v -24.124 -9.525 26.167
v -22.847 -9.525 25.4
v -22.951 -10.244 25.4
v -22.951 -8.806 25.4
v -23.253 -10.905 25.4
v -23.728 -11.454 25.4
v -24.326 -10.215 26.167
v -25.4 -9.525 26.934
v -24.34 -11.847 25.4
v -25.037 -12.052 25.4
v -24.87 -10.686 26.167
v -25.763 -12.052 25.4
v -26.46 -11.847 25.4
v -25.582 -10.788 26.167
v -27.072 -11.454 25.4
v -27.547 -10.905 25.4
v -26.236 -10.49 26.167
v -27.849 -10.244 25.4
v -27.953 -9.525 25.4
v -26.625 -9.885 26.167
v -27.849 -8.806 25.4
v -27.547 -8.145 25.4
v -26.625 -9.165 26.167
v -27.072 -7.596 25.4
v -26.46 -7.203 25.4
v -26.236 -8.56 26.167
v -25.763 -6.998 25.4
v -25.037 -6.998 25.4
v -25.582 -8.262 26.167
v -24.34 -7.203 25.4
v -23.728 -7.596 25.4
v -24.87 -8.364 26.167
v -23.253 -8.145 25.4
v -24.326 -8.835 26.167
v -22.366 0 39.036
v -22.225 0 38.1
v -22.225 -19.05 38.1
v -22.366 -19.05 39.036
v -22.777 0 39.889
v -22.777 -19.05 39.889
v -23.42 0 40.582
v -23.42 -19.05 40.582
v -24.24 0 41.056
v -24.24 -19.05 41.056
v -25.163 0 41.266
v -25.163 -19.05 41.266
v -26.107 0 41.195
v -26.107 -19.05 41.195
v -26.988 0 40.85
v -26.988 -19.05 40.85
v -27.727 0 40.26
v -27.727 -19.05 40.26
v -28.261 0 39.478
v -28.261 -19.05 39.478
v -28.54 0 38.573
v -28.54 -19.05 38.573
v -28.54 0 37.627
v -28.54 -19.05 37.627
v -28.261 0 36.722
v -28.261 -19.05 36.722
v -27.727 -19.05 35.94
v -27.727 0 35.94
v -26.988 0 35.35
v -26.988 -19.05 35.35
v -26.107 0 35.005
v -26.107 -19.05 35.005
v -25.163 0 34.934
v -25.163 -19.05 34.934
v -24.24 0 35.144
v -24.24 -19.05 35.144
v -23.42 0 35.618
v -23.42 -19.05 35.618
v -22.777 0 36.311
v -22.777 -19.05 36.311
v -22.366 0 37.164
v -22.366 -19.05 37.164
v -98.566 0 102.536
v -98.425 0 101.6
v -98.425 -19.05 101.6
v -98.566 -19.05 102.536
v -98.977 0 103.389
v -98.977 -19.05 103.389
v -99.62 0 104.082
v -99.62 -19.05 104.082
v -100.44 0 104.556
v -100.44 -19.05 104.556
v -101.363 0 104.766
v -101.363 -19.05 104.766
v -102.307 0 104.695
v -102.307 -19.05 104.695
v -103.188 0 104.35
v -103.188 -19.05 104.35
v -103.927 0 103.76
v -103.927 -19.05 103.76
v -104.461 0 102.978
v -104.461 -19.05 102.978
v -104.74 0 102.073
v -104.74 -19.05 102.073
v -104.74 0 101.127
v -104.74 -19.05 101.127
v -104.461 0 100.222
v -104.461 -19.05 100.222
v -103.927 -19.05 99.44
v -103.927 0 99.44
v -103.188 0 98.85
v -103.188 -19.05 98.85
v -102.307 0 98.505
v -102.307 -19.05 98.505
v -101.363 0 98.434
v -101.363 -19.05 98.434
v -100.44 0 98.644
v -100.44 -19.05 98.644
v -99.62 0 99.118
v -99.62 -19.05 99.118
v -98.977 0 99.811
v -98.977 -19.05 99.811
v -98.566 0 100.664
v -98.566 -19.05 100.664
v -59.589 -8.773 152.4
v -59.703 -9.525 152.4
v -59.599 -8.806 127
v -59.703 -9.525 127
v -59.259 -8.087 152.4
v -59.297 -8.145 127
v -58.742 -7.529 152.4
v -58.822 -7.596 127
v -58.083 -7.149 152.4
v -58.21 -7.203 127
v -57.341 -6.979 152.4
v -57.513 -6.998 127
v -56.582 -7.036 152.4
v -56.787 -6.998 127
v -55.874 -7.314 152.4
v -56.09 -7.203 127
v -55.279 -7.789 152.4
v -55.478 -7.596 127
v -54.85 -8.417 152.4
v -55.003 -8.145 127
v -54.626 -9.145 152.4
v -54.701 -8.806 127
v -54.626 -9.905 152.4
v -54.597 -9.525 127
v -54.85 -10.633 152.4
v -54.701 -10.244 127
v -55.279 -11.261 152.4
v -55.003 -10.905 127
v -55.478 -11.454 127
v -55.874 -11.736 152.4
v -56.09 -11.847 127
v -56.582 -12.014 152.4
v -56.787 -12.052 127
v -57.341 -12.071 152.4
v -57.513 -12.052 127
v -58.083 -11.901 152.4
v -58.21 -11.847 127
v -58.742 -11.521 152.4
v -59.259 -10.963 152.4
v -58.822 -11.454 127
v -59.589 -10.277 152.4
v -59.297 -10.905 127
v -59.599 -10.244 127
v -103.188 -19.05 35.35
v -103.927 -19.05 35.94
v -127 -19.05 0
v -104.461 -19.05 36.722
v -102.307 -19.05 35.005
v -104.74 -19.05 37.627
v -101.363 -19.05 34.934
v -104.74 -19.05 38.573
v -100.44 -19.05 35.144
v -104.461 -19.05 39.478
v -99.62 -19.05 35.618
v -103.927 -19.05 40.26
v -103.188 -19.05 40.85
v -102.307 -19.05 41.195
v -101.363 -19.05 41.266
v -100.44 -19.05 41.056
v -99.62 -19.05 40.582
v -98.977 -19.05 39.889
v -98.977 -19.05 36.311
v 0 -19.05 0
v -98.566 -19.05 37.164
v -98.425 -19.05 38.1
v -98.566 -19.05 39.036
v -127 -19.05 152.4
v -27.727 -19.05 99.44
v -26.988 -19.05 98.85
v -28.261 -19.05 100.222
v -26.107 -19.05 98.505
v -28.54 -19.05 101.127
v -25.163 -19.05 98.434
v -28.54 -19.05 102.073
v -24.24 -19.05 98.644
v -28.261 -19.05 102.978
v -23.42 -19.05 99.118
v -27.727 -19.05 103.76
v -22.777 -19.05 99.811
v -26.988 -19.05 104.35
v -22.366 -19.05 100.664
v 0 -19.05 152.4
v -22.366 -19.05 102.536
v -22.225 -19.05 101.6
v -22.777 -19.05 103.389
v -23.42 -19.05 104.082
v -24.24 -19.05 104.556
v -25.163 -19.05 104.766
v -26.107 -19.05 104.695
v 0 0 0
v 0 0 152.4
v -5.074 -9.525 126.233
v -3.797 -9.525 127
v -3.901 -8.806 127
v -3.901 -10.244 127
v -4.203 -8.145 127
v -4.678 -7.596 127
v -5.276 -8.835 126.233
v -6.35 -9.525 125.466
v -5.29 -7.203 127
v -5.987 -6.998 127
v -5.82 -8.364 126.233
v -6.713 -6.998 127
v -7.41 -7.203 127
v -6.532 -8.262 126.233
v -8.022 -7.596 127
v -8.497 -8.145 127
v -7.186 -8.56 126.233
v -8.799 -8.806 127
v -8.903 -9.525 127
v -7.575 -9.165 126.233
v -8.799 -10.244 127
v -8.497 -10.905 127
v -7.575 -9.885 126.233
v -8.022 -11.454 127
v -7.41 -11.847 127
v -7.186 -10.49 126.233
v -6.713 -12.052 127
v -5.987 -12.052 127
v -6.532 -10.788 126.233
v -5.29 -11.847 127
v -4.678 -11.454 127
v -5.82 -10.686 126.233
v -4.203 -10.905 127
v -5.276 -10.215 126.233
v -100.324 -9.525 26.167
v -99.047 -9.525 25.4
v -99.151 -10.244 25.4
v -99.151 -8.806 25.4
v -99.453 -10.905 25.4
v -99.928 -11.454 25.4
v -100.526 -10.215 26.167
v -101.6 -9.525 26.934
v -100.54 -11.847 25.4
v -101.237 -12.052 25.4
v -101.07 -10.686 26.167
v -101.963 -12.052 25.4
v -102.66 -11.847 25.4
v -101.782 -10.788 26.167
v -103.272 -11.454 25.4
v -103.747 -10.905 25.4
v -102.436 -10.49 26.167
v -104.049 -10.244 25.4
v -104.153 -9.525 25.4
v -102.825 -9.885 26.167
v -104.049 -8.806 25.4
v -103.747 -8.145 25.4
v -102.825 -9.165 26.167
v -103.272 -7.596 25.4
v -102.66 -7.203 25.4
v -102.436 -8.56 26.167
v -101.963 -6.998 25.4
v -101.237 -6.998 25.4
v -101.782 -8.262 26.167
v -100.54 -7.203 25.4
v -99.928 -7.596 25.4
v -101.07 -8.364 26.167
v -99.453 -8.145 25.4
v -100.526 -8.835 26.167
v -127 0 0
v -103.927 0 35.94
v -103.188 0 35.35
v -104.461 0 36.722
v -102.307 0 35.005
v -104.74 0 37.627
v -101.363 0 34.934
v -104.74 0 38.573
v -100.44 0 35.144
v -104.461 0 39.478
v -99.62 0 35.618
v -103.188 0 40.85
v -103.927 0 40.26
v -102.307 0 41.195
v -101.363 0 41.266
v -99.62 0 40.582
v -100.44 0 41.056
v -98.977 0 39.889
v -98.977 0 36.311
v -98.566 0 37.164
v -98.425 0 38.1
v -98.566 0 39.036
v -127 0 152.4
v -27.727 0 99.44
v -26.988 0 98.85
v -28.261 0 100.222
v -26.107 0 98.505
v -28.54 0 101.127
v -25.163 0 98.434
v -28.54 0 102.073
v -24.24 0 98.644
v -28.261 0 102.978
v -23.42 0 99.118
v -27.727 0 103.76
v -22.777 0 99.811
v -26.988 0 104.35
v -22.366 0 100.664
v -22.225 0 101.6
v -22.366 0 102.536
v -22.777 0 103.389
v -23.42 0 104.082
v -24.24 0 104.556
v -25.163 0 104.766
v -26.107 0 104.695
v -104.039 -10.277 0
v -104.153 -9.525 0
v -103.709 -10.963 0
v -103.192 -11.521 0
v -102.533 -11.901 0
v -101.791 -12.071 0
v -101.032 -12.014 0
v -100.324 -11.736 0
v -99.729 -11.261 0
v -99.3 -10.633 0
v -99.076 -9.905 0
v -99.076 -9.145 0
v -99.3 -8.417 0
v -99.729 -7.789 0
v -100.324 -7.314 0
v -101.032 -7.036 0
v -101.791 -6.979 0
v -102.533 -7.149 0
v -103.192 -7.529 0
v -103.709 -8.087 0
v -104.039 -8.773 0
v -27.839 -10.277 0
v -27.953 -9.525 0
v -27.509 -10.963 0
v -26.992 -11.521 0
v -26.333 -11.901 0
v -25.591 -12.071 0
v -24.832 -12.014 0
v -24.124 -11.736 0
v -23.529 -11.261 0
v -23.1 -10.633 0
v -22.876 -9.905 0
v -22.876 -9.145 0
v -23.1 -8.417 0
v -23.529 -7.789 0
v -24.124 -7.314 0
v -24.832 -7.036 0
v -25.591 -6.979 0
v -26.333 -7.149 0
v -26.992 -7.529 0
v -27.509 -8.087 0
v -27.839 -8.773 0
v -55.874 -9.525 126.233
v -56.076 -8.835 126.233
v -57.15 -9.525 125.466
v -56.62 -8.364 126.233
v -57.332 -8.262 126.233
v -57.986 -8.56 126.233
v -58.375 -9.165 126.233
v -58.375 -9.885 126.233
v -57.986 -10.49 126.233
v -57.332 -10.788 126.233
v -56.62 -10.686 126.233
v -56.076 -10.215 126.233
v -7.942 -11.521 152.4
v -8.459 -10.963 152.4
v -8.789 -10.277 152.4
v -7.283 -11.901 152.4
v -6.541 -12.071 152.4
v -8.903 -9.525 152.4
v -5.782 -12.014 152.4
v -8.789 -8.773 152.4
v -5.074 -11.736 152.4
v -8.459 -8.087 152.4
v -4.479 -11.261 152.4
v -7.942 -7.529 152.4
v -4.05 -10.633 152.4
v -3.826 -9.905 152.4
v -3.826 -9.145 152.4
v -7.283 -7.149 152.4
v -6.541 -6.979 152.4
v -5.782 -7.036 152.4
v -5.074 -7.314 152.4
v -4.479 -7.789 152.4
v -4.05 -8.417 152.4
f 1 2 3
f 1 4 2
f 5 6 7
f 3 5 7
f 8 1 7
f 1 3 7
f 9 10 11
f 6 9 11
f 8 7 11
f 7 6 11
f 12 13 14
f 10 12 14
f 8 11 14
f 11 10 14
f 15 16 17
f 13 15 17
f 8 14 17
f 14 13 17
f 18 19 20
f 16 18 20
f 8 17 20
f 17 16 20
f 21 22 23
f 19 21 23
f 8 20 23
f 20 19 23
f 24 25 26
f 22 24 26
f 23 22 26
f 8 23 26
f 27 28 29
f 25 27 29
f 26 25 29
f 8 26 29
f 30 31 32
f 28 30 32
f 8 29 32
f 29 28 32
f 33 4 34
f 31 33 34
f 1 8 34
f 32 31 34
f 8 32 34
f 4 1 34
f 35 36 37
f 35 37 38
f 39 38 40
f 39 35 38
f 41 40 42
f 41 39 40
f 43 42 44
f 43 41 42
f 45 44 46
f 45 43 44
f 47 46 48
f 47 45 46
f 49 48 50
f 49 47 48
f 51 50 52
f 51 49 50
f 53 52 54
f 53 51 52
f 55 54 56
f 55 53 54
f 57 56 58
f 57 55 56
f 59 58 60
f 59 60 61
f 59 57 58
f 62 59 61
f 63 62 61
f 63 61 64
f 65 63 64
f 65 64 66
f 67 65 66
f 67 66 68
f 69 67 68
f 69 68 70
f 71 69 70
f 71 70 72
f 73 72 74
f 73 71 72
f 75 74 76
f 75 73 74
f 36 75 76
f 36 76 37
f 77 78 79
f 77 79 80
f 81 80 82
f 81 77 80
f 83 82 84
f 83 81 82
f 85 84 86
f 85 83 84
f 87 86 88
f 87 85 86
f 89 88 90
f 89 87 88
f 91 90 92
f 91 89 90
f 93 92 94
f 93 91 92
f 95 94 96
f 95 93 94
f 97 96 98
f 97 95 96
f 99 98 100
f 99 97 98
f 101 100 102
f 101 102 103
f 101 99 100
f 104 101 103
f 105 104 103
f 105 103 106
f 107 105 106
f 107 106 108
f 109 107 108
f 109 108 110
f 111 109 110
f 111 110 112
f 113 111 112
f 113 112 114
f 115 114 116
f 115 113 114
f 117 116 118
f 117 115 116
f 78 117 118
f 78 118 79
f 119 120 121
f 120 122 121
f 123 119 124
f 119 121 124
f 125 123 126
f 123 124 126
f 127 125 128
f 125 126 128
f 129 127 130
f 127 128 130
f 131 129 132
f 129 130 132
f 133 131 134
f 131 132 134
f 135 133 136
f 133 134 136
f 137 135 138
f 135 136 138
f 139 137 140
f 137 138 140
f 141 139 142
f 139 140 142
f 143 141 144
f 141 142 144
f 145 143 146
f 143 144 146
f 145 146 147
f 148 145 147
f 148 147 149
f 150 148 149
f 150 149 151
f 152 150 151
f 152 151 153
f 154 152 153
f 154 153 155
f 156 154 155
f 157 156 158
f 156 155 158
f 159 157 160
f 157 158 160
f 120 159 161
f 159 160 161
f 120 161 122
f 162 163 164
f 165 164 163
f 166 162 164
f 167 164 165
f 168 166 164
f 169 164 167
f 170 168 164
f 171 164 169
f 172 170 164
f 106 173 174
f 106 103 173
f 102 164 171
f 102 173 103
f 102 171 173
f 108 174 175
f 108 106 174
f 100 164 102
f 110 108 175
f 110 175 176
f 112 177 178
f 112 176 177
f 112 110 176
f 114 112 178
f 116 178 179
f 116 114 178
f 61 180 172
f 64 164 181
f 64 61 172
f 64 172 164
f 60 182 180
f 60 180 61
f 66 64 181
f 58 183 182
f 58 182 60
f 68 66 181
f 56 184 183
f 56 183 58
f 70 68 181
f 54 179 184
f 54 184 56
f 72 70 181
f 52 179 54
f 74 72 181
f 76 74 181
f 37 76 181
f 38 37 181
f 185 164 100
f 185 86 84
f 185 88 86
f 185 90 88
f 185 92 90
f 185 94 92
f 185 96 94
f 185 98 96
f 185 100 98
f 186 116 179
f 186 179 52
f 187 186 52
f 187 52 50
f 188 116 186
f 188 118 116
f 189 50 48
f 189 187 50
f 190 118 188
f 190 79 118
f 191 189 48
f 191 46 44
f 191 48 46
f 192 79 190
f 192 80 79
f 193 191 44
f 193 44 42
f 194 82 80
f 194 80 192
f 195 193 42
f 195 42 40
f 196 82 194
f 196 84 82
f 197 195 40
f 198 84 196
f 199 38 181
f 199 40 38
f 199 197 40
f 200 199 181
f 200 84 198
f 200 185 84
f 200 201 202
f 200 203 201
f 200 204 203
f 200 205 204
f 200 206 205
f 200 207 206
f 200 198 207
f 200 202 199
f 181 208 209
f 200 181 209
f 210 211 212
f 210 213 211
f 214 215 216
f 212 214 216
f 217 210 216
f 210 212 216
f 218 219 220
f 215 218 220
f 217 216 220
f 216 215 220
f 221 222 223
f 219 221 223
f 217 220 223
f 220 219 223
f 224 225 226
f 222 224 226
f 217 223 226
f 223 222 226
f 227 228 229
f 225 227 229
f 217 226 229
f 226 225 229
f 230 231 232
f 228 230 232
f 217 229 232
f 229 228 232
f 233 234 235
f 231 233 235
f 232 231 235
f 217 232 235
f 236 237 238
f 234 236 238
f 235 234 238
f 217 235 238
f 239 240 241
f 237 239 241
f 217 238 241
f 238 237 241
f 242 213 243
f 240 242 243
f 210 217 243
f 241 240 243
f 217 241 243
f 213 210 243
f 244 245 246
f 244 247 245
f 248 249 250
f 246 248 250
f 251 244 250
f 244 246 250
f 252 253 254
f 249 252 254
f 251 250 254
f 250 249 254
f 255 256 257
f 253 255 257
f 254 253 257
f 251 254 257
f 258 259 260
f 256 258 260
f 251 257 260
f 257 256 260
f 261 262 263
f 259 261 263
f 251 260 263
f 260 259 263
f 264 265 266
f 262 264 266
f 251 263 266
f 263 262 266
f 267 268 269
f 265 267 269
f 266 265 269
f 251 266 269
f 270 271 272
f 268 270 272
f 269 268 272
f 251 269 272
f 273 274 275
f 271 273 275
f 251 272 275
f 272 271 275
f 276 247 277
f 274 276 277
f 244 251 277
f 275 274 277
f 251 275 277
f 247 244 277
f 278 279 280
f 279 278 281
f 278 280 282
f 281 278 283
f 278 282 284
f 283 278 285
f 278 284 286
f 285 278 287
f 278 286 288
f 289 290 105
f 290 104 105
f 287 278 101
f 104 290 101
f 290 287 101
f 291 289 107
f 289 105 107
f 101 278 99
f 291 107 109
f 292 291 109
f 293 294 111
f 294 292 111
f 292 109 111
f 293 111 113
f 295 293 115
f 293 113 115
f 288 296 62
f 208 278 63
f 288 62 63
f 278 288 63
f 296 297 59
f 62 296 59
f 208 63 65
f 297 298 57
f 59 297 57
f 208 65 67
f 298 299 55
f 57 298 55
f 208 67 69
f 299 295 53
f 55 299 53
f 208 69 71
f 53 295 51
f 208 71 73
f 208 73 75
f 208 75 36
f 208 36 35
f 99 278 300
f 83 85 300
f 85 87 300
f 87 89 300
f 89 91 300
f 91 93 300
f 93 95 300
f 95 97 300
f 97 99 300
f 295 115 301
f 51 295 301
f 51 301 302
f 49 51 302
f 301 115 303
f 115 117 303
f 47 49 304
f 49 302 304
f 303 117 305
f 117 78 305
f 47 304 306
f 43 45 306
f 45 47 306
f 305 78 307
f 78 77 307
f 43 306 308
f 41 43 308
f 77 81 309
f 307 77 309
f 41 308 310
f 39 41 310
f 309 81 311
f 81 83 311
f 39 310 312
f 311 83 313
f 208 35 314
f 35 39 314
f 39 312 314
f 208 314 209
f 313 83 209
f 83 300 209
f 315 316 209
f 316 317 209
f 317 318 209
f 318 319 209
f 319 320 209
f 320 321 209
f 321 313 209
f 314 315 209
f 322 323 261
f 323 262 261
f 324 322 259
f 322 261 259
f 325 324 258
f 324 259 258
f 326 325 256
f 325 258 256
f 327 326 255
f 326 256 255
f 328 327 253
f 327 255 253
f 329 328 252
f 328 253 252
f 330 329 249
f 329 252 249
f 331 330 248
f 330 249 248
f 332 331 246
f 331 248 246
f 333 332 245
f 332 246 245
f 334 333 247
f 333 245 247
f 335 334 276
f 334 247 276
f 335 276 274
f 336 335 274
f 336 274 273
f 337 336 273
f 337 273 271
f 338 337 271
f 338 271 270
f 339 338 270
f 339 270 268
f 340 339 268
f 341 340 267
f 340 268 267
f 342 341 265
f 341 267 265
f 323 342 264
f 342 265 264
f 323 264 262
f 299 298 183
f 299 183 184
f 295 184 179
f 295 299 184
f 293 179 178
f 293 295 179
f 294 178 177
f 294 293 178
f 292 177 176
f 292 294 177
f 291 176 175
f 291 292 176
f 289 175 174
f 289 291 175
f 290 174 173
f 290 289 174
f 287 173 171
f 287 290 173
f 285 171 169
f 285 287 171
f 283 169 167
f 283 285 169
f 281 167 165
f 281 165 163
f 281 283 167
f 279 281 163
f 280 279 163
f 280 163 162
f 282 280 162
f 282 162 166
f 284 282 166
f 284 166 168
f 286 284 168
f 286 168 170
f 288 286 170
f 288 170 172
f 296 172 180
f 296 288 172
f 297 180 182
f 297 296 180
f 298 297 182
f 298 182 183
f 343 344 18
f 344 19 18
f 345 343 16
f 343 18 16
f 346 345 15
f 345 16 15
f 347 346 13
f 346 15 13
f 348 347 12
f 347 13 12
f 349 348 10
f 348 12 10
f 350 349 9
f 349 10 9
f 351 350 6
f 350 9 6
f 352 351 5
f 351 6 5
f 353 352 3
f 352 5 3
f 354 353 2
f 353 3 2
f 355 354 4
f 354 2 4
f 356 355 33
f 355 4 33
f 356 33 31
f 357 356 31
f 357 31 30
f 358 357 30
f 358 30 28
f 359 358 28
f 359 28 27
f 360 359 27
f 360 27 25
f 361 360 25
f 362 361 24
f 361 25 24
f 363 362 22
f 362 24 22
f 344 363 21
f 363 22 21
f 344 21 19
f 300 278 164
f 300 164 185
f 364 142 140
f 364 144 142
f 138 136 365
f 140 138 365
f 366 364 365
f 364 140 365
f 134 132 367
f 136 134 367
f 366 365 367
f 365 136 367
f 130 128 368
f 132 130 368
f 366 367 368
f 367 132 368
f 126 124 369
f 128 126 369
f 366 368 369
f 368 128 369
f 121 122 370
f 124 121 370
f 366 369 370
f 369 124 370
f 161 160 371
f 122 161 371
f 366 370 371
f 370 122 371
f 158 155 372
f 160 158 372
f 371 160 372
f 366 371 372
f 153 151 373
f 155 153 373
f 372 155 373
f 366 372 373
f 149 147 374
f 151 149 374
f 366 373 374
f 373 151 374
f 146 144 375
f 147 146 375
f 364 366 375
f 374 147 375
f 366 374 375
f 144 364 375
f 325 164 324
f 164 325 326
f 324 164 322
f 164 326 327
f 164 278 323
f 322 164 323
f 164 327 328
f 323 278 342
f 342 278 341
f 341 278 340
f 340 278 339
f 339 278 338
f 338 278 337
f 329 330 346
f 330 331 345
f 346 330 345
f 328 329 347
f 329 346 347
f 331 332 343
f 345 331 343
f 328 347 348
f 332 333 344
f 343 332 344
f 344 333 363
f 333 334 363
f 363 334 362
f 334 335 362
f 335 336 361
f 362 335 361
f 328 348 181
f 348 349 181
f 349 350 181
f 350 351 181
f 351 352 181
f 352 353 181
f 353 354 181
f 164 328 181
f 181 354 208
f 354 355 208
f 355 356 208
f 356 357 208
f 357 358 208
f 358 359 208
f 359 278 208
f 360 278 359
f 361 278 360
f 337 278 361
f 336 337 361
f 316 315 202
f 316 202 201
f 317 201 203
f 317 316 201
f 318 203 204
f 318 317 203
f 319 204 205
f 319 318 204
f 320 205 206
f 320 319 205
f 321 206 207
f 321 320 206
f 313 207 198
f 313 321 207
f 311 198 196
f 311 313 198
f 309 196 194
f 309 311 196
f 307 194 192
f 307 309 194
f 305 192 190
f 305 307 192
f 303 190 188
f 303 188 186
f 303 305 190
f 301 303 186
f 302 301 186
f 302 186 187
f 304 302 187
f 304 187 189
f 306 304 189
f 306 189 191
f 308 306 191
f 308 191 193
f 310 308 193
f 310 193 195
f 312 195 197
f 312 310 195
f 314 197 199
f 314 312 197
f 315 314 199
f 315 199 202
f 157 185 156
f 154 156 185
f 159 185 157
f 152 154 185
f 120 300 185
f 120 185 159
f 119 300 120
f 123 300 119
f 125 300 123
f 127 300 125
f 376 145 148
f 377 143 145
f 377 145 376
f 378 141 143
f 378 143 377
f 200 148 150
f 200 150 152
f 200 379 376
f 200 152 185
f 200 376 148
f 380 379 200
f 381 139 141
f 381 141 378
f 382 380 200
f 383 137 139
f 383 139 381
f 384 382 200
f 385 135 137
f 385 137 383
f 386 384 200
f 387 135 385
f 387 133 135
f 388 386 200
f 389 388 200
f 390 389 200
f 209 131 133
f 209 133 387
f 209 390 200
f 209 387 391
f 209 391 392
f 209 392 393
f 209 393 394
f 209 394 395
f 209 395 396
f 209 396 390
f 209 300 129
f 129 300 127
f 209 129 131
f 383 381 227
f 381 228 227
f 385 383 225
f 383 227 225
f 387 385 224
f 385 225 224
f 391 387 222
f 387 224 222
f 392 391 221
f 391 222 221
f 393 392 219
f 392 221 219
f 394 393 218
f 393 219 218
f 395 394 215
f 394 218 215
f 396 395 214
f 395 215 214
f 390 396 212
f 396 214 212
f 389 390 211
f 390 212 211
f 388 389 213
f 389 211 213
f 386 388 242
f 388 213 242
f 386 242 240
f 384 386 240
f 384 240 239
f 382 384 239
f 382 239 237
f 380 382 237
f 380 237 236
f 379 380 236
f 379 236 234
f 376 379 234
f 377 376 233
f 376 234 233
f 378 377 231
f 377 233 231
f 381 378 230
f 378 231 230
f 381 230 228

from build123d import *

# Parameters (mm, degrees)
F0_W     = 127
F0_H     = 152.4
F0_R     = 3.175
F1_DEPTH = 19.05
F3_D     = 5.1054
F3_DEPTH = 25.4
F3_TIP   = 1.5338169022
F5_D     = 5.1054
F5_DEPTH = 25.4
F5_TIP   = 1.5338169022
F6_D     = 5.1054
F6_DEPTH = 25.4
F6_TIP   = 1.5338169022


with BuildPart() as f1:
    # F0 (on Front) → F1 (new body)
    with BuildSketch(Plane.XZ):
        with Locations((-63.5, 76.2)):
            Rectangle(F0_W, F0_H)
        with Locations((-101.6, 38.1)):
            Circle(F0_R, mode=Mode.SUBTRACT)
        with Locations((-25.4, 38.1)):
            Circle(F0_R, mode=Mode.SUBTRACT)
        with Locations((-101.6, 101.6)):
            Circle(F0_R, mode=Mode.SUBTRACT)
        with Locations((-25.4, 101.6)):
            Circle(F0_R, mode=Mode.SUBTRACT)
    extrude(amount=F1_DEPTH)

    # F3
    with Locations(Plane(origin=(0, 0, 0), x_dir=(1, 0, 0), z_dir=(0, 0, -1))):
        with Locations((-101.6, 9.525), (-25.4, 9.525)):
            Hole(F3_D / 2, depth=F3_DEPTH)
            with Locations((0, 0, -(F3_DEPTH + F3_TIP / 2))):  # 118° drill point
                Cone(0, F3_D / 2, F3_TIP, mode=Mode.SUBTRACT)

    # F5
    with Locations(Plane.XY.offset(152.4)):
        with Locations((-57.15, -9.525)):
            Hole(F5_D / 2, depth=F5_DEPTH)
            with Locations((0, 0, -(F5_DEPTH + F5_TIP / 2))):  # 118° drill point
                Cone(0, F5_D / 2, F5_TIP, mode=Mode.SUBTRACT)

    # F6
    with Locations(Plane.XY.offset(152.4)):
        with Locations((-6.35, -9.525)):
            Hole(F6_D / 2, depth=F6_DEPTH)
            with Locations((0, 0, -(F6_DEPTH + F6_TIP / 2))):  # 118° drill point
                Cone(0, F6_D / 2, F6_TIP, mode=Mode.SUBTRACT)


solid = f1.part
